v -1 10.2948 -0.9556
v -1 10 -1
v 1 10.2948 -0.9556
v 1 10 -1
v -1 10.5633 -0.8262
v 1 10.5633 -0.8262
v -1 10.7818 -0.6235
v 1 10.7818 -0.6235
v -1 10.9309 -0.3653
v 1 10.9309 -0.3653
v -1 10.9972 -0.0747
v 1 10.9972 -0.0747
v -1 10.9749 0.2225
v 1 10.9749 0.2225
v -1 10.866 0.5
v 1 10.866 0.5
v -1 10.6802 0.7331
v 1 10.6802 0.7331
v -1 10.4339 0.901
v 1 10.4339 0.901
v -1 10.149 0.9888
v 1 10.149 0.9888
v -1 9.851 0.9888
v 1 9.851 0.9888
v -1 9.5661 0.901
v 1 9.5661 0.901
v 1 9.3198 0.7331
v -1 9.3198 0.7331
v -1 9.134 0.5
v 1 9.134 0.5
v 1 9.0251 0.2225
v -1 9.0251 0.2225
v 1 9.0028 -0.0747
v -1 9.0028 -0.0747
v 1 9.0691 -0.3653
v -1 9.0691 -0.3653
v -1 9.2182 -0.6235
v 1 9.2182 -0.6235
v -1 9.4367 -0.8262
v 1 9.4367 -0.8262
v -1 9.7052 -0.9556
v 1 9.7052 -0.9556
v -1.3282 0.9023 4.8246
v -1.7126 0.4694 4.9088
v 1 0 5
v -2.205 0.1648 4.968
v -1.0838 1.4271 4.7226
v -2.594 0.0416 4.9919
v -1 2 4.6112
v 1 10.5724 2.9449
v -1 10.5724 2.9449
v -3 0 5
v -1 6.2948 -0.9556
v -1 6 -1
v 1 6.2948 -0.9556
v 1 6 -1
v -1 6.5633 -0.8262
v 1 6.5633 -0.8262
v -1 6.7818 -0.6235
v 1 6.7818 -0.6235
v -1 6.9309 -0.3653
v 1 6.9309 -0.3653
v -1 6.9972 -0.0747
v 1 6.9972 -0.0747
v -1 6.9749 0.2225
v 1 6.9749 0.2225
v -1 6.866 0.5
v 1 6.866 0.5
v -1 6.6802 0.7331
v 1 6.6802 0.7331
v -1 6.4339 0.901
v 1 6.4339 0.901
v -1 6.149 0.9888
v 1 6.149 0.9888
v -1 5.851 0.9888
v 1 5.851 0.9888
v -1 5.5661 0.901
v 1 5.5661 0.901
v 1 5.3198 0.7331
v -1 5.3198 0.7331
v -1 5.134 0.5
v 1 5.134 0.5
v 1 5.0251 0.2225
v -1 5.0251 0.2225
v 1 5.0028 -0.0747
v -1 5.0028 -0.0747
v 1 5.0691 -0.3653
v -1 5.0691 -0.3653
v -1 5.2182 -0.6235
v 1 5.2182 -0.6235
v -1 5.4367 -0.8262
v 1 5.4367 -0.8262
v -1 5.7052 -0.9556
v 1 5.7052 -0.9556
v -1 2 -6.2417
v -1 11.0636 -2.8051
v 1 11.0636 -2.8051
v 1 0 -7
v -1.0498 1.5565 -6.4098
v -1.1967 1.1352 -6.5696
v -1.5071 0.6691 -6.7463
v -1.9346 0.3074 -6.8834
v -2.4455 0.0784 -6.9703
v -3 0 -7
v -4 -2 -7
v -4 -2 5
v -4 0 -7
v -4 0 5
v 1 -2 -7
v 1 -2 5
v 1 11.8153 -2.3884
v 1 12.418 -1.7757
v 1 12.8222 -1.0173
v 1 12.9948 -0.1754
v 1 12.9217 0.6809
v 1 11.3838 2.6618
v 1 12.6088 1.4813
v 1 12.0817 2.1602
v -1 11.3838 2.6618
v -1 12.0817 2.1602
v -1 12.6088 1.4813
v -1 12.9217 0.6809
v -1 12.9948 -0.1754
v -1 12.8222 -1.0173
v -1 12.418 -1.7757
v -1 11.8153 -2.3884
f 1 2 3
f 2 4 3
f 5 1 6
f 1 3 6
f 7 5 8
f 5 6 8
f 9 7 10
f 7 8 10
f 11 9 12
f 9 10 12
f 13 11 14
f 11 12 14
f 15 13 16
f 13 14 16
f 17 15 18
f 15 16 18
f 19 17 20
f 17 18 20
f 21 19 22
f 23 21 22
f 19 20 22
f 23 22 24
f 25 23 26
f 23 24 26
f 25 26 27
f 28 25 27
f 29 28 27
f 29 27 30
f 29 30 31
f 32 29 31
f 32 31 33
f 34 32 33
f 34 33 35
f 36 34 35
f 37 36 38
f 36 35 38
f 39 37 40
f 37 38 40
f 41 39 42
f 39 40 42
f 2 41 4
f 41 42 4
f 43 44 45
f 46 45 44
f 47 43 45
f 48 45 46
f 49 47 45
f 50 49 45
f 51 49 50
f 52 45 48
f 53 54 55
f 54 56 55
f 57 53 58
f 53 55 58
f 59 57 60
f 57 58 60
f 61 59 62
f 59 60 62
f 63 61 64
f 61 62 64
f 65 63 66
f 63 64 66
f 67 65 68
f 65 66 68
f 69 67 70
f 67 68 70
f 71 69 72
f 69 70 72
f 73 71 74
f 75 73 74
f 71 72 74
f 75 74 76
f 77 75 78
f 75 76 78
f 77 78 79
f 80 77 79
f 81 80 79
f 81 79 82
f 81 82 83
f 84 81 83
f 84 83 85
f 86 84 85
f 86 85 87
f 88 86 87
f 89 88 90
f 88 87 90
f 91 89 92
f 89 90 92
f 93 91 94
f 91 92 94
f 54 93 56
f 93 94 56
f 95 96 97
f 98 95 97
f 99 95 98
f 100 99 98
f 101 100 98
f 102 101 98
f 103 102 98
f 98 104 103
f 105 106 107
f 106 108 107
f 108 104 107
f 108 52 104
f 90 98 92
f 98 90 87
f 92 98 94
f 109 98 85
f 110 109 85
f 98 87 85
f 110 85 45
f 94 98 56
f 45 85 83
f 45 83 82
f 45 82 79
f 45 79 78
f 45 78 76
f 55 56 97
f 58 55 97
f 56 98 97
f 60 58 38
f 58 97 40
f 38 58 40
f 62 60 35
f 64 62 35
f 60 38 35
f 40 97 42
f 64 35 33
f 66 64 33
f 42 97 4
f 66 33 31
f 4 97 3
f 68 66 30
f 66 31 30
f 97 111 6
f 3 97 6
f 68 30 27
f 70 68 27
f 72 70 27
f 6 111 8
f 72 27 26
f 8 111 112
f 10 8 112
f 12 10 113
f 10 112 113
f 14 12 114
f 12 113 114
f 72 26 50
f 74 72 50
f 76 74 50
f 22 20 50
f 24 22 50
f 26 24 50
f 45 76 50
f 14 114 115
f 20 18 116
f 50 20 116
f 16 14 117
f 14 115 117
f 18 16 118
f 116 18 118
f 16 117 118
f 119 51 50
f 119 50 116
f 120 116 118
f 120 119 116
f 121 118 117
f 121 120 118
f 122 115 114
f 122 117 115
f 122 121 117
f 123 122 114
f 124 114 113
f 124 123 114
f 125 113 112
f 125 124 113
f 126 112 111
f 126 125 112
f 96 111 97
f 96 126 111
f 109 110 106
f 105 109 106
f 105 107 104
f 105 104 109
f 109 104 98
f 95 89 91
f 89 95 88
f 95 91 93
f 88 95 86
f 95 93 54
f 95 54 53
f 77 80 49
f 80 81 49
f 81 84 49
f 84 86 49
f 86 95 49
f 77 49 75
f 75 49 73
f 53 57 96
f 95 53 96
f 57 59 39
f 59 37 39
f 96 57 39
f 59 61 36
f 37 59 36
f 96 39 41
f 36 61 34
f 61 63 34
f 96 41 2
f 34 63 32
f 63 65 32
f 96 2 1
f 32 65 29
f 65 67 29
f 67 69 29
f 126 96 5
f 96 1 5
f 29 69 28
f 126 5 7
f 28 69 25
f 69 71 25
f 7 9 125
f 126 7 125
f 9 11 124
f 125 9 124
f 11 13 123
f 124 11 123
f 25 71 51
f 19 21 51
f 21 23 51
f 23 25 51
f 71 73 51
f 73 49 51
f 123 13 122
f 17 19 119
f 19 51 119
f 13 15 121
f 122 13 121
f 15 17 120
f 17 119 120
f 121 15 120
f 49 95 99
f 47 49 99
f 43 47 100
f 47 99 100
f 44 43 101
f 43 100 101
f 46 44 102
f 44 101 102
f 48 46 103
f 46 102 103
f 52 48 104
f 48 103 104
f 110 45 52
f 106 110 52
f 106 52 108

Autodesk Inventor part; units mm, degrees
ref_plane "YZ Plane" through (0, 0, 0) normal (1, 0, 0) x (0, 1, 0)
ref_plane "XZ Plane" through (0, 0, 0) normal (0, 1, 0) x (-1, 0, 0)
ref_plane "XY Plane" through (0, 0, 0) normal (0, 0, 1) x (1, 0, 0)
sketch "Skizze1" plane through (0, 0, 0) normal (1, 0, 0) x (0, 1, 0)
  arc A0 (11.0636, -2.8051) -> (10.5724, 2.9449) centre (10, 0) ccw
  line L0 (11.0636, -2.8051) -> (0, -7)
  line L1 (0, -7) -> (0, 5)
  line L2 (0, 5) -> (10.5724, 2.9449)
  point P0 (0, 0)
  dimension "d0" = 3
  dimension "d1" = 10
  dimension "d2" = 12
  dimension "d3" = 5
extrude "Extrusion1" add sketch "Skizze1" along normal mid plane 2
sketch "Skizze2" plane through (0, 0, 0) normal (0, 1, 0) x (-1, 0, 0)
  line L0 (-1, 2.9449) -> (-1, 5) projected
  line L1 (-1, 5) -> (4, 5)
  line L2 (4, 5) -> (4, -7)
  line L3 (4, -7) -> (-1, -7)
  line L4 (-1, -7) -> (-1, 5)
  line L5 (1, -7) -> (-1, -7) projected
  point P0 (0, 0)
  point P1 (-1, 2.9449)
  dimension "d6" = 5
extrude "Extrusion2" add sketch "Skizze2" against normal blind 2
fillet "Rundung1" radius 2 1 edges at (-1, 0, -1)
sketch "Skizze3" plane through (1, 0, 0) normal (1, 0, 0) x (0, 0, -1)
  arc A0 (2.8051, 11.0636) -> (-2.9449, 10.5724) centre (0, 10) ccw projected
  circle A1 centre (0, 10) radius 1
  line L0 (0, 10) -> (0, -2) construction
  line L1 (7, -2) -> (-5, -2) projected
  circle A2 centre (0, 6) radius 1
  point P0 (0, 0)
  dimension "d10" = 2
  dimension "d13" = 4
extrude "Extrusion3" cut sketch "Skizze3" against normal blind 4.75
properties part number "P_Wing_aileron_lever"
